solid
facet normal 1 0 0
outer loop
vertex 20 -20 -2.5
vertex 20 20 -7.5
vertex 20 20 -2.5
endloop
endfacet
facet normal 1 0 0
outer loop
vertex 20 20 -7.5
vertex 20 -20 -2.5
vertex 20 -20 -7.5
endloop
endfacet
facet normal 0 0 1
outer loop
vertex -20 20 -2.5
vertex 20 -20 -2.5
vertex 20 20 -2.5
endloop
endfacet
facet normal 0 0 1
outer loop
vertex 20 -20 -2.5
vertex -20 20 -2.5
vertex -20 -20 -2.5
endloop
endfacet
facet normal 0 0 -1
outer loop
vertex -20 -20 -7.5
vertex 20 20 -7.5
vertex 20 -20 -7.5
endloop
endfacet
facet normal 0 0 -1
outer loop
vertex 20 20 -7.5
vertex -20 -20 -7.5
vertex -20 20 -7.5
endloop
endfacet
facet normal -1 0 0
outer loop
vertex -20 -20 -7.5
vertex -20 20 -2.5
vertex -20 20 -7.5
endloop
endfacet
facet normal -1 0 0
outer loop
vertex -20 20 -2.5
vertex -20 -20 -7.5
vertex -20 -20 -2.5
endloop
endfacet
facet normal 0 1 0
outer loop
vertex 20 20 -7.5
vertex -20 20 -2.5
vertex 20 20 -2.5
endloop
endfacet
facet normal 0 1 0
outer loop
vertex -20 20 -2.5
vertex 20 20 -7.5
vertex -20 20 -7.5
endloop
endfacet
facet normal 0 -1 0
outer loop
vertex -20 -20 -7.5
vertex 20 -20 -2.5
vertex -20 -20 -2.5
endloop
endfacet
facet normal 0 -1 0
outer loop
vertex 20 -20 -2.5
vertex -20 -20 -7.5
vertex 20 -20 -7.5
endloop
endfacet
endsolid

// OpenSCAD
/**
 * Logo test
 */
 
logo = "./RPiLogo.png";

difference() {
  translate([0, 0, -5]) {
     cube(size=[40, 40, 5], center=true);
  }

  scale([0.1, 0.1, 0.2]) {
    color("green") {
      rotate([0, 0, 0]) {
        surface(file=logo, invert=true, center=true);
      }
    }
  }
}

/*
color("red") {
  linear_extrude(height=5, center=true, convexity=10) {
    import(file=logo);
  }
}
*/
